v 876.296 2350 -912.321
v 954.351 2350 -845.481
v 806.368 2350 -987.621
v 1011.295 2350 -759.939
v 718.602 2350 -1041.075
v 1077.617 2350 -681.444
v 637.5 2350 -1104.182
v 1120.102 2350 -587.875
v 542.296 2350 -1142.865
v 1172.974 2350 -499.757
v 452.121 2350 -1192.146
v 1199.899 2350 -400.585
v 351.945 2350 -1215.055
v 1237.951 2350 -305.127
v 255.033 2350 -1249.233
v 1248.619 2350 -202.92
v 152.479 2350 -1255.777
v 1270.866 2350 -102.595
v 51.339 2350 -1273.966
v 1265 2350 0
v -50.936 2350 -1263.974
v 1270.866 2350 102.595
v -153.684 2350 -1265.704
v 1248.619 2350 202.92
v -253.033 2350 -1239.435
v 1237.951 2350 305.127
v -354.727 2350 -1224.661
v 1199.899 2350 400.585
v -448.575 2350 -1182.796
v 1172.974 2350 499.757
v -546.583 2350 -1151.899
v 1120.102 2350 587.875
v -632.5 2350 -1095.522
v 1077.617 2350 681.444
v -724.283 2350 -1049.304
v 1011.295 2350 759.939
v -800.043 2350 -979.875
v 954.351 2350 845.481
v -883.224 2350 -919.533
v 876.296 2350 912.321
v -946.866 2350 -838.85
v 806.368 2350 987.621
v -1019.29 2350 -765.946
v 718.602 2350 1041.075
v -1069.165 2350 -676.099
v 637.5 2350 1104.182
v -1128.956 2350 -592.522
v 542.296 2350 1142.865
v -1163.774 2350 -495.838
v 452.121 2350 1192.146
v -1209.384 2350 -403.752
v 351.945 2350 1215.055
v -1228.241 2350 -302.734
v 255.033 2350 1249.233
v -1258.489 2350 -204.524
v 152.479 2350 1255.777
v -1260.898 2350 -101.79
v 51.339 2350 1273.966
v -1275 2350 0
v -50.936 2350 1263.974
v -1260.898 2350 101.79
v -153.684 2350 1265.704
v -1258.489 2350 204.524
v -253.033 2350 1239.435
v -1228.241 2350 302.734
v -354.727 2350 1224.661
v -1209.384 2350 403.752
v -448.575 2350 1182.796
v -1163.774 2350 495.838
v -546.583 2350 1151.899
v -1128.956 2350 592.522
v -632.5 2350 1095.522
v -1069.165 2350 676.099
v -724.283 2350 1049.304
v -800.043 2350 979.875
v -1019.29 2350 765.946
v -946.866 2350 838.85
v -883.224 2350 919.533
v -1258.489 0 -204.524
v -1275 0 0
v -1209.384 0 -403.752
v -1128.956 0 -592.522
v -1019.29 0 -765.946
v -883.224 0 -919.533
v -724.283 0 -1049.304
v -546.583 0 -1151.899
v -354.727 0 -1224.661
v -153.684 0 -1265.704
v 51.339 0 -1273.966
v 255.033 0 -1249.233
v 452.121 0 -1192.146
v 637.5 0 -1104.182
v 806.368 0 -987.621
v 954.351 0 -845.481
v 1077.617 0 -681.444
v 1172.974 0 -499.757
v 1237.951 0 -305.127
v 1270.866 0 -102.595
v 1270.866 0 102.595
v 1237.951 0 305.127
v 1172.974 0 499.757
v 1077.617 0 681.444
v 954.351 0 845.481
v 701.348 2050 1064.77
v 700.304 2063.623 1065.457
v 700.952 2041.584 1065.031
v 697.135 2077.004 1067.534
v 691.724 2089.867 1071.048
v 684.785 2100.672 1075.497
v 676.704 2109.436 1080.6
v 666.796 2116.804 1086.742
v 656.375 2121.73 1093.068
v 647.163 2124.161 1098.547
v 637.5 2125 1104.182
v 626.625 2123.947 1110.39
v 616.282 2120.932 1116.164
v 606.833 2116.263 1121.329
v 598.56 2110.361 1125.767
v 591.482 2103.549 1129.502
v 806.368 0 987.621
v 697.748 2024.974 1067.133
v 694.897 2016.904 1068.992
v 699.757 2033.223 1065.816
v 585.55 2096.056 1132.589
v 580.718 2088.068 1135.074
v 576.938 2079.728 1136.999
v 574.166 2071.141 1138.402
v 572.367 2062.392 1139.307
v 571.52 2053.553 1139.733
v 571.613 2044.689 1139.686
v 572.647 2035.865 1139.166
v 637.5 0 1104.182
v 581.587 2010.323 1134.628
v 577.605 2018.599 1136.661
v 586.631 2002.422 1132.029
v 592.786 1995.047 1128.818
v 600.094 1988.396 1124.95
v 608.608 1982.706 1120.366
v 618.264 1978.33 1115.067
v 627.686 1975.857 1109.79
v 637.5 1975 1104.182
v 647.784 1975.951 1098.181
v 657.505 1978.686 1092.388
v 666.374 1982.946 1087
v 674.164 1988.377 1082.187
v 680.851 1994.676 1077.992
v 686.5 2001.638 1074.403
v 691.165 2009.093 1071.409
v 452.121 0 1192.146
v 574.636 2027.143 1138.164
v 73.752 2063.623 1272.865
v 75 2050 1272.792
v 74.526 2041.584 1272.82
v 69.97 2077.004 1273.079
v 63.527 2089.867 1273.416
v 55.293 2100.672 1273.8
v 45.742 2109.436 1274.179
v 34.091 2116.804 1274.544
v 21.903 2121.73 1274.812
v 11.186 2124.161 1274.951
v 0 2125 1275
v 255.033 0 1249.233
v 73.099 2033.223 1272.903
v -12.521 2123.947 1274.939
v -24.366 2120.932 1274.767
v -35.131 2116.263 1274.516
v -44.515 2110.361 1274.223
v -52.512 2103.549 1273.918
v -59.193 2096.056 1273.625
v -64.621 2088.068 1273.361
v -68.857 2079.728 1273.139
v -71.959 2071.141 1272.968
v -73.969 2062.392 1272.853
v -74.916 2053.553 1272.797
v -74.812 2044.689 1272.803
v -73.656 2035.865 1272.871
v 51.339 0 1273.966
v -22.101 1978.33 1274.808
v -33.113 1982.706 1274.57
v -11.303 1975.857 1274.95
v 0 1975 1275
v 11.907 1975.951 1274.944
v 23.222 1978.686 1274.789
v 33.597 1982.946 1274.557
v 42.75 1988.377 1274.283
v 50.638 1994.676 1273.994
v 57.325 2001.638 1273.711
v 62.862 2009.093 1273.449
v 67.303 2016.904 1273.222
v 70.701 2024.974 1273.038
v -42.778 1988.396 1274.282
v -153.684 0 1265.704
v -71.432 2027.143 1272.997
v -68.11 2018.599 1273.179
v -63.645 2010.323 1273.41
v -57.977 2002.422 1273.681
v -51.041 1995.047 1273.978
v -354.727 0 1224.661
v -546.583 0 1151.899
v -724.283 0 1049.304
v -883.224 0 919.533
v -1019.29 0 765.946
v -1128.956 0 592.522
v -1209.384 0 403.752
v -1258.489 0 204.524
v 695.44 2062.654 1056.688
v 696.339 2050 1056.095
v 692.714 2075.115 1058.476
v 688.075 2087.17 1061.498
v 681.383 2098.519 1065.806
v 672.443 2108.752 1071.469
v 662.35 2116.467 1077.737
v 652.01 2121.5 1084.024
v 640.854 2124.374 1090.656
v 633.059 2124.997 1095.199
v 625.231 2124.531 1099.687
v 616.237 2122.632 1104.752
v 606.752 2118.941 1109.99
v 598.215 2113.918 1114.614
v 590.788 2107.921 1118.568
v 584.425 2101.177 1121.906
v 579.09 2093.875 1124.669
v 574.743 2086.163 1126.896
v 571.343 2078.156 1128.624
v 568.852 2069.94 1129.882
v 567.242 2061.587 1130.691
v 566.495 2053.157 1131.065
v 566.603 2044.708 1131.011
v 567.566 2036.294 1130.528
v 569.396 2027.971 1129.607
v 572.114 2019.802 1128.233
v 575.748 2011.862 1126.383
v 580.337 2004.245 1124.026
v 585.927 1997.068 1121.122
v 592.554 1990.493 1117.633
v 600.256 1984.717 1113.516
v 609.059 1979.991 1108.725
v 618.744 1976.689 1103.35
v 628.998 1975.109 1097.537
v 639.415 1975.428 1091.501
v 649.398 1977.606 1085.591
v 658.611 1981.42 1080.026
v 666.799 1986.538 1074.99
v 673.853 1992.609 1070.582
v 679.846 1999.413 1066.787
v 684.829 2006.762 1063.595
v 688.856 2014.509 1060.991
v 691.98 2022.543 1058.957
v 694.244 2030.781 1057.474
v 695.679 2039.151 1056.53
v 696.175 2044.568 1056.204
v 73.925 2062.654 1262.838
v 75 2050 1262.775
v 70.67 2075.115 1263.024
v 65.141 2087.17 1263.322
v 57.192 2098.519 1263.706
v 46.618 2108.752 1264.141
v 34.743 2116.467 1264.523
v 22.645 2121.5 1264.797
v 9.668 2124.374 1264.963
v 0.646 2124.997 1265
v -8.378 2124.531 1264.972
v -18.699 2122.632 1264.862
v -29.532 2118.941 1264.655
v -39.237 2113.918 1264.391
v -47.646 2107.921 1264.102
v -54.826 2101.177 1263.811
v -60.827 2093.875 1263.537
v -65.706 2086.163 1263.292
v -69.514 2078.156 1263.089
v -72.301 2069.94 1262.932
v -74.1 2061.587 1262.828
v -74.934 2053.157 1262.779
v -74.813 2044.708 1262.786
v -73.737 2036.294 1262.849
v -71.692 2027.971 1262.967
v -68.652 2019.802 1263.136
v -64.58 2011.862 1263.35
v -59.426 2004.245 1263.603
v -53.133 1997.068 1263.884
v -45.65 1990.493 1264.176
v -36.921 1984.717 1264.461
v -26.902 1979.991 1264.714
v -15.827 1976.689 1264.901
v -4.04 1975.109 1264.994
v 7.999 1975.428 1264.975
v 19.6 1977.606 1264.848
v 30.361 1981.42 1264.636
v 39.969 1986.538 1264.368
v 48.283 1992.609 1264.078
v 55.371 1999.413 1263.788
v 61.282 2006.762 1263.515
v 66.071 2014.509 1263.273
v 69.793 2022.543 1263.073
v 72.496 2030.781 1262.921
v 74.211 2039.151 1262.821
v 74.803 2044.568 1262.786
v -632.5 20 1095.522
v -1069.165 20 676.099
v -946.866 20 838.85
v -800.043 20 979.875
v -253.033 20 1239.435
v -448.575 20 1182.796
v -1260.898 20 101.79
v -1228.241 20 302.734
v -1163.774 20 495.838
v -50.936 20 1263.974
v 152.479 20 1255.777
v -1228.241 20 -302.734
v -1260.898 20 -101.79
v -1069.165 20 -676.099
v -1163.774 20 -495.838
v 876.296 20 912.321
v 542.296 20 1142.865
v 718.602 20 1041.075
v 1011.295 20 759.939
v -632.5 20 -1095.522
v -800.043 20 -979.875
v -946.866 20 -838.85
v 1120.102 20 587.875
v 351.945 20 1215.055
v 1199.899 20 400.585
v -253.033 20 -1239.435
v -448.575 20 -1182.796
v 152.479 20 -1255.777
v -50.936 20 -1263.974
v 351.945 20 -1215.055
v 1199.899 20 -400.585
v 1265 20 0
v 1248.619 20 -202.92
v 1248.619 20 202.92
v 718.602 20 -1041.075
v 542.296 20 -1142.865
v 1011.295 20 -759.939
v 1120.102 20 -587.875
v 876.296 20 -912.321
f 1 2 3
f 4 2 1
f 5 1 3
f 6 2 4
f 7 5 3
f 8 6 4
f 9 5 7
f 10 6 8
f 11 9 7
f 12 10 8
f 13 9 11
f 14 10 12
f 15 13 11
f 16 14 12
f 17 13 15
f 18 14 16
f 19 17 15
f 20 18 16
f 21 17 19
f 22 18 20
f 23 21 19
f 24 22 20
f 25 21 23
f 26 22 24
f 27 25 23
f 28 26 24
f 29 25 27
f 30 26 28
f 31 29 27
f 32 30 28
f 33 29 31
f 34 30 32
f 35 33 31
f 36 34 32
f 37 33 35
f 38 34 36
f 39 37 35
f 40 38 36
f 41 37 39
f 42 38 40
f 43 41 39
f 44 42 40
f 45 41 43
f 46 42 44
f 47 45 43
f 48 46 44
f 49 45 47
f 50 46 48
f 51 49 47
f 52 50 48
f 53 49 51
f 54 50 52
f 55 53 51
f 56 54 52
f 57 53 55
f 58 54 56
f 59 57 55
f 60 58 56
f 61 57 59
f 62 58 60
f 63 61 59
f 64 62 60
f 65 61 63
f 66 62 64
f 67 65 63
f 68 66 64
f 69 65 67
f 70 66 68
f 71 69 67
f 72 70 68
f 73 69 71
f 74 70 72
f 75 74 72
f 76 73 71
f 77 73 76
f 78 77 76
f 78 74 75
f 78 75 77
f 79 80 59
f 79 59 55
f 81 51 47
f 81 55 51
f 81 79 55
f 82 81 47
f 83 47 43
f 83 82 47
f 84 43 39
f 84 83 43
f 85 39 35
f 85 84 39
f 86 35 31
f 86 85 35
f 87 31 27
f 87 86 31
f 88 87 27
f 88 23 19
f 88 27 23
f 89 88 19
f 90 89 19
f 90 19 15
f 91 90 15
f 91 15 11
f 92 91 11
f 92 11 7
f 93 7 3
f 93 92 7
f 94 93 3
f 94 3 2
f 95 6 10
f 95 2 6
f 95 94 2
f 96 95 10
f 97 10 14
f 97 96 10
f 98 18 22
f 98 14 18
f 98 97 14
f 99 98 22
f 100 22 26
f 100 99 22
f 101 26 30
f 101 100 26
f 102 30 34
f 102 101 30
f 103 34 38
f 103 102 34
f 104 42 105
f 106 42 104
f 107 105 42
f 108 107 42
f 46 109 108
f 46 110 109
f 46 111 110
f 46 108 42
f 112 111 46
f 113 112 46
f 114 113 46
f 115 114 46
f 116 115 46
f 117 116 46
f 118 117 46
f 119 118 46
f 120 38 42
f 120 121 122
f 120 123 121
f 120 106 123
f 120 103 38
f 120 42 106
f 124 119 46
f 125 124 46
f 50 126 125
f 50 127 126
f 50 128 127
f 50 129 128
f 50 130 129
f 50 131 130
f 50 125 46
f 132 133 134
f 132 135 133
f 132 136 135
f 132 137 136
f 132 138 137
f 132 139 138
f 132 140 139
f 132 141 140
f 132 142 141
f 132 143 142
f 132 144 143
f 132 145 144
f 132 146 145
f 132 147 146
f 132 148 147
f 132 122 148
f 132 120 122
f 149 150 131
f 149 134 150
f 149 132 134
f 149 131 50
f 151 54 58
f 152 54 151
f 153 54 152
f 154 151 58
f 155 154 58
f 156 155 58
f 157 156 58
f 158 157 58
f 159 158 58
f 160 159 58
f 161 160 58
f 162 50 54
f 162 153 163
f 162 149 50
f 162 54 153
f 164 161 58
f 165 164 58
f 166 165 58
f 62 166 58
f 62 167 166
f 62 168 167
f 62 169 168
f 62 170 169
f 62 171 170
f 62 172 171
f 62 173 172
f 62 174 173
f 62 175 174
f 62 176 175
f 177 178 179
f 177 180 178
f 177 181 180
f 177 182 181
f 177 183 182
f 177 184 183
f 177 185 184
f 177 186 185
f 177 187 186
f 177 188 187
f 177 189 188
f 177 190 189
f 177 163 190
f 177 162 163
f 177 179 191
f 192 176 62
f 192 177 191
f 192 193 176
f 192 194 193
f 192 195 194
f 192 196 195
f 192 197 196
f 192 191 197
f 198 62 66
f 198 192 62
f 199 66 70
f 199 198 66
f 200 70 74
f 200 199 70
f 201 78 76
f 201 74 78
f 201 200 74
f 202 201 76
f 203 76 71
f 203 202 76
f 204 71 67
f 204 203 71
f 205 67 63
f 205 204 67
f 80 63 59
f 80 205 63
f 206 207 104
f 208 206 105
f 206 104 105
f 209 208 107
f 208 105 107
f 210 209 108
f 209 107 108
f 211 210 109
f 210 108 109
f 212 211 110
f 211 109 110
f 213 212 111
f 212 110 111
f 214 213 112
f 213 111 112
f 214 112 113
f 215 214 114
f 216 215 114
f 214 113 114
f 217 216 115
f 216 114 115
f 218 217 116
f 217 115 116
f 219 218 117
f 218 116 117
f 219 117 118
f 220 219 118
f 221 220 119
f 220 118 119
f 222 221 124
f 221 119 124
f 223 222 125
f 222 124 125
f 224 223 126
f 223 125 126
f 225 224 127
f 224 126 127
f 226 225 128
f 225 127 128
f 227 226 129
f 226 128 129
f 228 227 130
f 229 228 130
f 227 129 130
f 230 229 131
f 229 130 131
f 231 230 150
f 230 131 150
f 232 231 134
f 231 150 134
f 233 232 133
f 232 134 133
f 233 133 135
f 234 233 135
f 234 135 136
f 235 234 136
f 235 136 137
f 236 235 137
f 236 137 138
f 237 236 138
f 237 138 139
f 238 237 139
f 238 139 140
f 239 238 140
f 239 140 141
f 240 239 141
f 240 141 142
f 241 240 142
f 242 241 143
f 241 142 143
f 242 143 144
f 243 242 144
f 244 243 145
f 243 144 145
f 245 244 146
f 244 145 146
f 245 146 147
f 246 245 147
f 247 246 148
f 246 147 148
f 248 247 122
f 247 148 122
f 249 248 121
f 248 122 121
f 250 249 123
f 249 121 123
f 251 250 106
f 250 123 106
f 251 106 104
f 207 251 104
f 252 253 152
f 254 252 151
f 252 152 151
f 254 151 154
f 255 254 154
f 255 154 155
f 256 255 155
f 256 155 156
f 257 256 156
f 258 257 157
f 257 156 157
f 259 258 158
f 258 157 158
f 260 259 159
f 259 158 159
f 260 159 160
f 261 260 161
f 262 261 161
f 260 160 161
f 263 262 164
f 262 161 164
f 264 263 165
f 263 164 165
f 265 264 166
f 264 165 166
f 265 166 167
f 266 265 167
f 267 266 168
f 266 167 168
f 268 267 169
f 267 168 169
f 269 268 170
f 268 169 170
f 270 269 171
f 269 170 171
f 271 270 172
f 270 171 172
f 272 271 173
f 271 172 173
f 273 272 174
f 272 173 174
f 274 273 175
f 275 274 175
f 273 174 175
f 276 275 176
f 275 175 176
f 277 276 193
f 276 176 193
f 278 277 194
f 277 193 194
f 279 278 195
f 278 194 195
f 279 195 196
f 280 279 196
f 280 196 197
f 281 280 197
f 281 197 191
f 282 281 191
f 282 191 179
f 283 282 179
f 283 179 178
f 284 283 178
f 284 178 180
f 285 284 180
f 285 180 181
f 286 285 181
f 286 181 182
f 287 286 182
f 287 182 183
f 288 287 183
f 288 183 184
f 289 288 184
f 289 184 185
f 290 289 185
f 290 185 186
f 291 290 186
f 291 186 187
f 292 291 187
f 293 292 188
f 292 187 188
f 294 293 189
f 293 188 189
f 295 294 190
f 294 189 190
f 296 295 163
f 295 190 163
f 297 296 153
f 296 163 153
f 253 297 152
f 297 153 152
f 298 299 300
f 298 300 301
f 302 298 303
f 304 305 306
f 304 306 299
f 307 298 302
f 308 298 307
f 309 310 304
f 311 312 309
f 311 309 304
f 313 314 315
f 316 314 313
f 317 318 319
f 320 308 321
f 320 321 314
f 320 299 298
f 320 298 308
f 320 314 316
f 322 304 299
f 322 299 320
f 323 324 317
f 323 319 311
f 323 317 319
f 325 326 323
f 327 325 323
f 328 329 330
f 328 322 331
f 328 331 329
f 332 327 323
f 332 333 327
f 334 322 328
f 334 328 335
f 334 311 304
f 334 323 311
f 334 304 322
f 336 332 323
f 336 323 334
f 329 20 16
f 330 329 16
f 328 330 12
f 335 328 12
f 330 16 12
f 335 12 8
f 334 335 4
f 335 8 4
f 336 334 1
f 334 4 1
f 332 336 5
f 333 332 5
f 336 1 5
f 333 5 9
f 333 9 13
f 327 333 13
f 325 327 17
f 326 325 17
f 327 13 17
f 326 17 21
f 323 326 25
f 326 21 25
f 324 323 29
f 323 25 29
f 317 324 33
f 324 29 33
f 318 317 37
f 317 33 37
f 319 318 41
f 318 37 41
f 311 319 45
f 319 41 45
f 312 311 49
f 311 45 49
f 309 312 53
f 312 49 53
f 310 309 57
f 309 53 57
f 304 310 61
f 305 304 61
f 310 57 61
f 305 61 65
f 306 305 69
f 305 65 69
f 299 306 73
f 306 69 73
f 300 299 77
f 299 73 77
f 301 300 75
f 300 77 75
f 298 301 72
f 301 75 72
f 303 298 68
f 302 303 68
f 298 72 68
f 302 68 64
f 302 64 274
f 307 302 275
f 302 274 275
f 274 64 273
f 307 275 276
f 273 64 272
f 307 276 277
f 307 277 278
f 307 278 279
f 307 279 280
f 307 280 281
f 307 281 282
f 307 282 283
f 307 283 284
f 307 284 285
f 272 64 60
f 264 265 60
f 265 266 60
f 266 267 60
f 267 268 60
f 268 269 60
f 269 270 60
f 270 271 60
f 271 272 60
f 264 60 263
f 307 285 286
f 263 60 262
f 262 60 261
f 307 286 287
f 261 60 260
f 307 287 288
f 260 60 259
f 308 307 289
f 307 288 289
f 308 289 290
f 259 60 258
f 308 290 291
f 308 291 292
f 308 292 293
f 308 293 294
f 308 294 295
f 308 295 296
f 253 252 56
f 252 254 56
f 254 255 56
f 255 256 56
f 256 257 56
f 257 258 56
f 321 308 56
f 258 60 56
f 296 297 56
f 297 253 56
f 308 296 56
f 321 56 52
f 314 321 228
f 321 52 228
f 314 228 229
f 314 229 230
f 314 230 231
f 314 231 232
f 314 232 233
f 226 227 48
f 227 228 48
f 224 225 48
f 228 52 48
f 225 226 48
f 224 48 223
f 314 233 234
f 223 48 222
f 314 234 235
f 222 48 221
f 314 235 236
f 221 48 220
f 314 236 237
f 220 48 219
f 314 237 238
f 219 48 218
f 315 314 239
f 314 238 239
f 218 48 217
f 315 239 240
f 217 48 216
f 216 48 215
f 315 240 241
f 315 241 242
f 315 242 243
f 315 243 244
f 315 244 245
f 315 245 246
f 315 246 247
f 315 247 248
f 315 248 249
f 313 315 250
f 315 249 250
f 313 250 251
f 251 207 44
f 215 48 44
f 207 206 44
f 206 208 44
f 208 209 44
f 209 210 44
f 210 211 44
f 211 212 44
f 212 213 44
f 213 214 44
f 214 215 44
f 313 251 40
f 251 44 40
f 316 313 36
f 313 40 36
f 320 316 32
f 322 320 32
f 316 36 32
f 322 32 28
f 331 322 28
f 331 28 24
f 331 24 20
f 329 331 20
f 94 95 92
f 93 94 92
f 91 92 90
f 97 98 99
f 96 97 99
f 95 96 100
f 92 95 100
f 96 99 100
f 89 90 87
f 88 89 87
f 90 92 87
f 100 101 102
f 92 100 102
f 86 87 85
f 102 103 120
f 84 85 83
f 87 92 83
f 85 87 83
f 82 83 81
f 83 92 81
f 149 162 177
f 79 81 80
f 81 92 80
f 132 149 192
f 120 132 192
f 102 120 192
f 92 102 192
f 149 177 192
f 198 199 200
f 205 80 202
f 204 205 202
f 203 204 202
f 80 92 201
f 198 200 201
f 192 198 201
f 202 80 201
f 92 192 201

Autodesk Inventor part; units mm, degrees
ref_plane "YZ Plane" through (0, 0, 0) normal (1, 0, 0) x (0, 1, 0)
ref_plane "XZ Plane" through (0, 0, 0) normal (0, 1, 0) x (-1, 0, 0)
sketch "Sketch1" plane through (0, 0, 0) normal (0, 1, 0) x (-1, 0, 0)
  circle A0 centre (0, 0) radius 1275
  dimension "d0" = 2550
extrude "Extrusion1" add sketch "Sketch1" along normal blind 2350
sketch "Sketch2" plane through (0, 2350, 0) normal (0, 1, 0) x (1, 0, 0)
  circle A0 centre (0, 0) radius 1265
  dimension "d3" = 2530
extrude "Extrusion2" cut sketch "Sketch2" against normal blind 2330
ref_plane "Work Plane2" through (0, 0, 1275) normal (0, 0, 1) x (1, 0, 0)
sketch "Sketch3" plane through (0, 0, 1275) normal (0, 0, 1) x (1, 0, 0)
  circle A0 centre (0, 2050) radius 75
  line L0 (1275, 2350) -> (-1275, 2350) projected
  point P0 (0, 0)
  dimension "d6" = 150
  dimension "d7" = 300
extrude "Extrusion3" cut sketch "Sketch3" against normal blind 30
pattern_circular "Circular Pattern1" count 2 over 30 about axis through (0, -10, 0) along (0, 1, 0) of "Extrusion3"
properties part number "fish tank 1"
